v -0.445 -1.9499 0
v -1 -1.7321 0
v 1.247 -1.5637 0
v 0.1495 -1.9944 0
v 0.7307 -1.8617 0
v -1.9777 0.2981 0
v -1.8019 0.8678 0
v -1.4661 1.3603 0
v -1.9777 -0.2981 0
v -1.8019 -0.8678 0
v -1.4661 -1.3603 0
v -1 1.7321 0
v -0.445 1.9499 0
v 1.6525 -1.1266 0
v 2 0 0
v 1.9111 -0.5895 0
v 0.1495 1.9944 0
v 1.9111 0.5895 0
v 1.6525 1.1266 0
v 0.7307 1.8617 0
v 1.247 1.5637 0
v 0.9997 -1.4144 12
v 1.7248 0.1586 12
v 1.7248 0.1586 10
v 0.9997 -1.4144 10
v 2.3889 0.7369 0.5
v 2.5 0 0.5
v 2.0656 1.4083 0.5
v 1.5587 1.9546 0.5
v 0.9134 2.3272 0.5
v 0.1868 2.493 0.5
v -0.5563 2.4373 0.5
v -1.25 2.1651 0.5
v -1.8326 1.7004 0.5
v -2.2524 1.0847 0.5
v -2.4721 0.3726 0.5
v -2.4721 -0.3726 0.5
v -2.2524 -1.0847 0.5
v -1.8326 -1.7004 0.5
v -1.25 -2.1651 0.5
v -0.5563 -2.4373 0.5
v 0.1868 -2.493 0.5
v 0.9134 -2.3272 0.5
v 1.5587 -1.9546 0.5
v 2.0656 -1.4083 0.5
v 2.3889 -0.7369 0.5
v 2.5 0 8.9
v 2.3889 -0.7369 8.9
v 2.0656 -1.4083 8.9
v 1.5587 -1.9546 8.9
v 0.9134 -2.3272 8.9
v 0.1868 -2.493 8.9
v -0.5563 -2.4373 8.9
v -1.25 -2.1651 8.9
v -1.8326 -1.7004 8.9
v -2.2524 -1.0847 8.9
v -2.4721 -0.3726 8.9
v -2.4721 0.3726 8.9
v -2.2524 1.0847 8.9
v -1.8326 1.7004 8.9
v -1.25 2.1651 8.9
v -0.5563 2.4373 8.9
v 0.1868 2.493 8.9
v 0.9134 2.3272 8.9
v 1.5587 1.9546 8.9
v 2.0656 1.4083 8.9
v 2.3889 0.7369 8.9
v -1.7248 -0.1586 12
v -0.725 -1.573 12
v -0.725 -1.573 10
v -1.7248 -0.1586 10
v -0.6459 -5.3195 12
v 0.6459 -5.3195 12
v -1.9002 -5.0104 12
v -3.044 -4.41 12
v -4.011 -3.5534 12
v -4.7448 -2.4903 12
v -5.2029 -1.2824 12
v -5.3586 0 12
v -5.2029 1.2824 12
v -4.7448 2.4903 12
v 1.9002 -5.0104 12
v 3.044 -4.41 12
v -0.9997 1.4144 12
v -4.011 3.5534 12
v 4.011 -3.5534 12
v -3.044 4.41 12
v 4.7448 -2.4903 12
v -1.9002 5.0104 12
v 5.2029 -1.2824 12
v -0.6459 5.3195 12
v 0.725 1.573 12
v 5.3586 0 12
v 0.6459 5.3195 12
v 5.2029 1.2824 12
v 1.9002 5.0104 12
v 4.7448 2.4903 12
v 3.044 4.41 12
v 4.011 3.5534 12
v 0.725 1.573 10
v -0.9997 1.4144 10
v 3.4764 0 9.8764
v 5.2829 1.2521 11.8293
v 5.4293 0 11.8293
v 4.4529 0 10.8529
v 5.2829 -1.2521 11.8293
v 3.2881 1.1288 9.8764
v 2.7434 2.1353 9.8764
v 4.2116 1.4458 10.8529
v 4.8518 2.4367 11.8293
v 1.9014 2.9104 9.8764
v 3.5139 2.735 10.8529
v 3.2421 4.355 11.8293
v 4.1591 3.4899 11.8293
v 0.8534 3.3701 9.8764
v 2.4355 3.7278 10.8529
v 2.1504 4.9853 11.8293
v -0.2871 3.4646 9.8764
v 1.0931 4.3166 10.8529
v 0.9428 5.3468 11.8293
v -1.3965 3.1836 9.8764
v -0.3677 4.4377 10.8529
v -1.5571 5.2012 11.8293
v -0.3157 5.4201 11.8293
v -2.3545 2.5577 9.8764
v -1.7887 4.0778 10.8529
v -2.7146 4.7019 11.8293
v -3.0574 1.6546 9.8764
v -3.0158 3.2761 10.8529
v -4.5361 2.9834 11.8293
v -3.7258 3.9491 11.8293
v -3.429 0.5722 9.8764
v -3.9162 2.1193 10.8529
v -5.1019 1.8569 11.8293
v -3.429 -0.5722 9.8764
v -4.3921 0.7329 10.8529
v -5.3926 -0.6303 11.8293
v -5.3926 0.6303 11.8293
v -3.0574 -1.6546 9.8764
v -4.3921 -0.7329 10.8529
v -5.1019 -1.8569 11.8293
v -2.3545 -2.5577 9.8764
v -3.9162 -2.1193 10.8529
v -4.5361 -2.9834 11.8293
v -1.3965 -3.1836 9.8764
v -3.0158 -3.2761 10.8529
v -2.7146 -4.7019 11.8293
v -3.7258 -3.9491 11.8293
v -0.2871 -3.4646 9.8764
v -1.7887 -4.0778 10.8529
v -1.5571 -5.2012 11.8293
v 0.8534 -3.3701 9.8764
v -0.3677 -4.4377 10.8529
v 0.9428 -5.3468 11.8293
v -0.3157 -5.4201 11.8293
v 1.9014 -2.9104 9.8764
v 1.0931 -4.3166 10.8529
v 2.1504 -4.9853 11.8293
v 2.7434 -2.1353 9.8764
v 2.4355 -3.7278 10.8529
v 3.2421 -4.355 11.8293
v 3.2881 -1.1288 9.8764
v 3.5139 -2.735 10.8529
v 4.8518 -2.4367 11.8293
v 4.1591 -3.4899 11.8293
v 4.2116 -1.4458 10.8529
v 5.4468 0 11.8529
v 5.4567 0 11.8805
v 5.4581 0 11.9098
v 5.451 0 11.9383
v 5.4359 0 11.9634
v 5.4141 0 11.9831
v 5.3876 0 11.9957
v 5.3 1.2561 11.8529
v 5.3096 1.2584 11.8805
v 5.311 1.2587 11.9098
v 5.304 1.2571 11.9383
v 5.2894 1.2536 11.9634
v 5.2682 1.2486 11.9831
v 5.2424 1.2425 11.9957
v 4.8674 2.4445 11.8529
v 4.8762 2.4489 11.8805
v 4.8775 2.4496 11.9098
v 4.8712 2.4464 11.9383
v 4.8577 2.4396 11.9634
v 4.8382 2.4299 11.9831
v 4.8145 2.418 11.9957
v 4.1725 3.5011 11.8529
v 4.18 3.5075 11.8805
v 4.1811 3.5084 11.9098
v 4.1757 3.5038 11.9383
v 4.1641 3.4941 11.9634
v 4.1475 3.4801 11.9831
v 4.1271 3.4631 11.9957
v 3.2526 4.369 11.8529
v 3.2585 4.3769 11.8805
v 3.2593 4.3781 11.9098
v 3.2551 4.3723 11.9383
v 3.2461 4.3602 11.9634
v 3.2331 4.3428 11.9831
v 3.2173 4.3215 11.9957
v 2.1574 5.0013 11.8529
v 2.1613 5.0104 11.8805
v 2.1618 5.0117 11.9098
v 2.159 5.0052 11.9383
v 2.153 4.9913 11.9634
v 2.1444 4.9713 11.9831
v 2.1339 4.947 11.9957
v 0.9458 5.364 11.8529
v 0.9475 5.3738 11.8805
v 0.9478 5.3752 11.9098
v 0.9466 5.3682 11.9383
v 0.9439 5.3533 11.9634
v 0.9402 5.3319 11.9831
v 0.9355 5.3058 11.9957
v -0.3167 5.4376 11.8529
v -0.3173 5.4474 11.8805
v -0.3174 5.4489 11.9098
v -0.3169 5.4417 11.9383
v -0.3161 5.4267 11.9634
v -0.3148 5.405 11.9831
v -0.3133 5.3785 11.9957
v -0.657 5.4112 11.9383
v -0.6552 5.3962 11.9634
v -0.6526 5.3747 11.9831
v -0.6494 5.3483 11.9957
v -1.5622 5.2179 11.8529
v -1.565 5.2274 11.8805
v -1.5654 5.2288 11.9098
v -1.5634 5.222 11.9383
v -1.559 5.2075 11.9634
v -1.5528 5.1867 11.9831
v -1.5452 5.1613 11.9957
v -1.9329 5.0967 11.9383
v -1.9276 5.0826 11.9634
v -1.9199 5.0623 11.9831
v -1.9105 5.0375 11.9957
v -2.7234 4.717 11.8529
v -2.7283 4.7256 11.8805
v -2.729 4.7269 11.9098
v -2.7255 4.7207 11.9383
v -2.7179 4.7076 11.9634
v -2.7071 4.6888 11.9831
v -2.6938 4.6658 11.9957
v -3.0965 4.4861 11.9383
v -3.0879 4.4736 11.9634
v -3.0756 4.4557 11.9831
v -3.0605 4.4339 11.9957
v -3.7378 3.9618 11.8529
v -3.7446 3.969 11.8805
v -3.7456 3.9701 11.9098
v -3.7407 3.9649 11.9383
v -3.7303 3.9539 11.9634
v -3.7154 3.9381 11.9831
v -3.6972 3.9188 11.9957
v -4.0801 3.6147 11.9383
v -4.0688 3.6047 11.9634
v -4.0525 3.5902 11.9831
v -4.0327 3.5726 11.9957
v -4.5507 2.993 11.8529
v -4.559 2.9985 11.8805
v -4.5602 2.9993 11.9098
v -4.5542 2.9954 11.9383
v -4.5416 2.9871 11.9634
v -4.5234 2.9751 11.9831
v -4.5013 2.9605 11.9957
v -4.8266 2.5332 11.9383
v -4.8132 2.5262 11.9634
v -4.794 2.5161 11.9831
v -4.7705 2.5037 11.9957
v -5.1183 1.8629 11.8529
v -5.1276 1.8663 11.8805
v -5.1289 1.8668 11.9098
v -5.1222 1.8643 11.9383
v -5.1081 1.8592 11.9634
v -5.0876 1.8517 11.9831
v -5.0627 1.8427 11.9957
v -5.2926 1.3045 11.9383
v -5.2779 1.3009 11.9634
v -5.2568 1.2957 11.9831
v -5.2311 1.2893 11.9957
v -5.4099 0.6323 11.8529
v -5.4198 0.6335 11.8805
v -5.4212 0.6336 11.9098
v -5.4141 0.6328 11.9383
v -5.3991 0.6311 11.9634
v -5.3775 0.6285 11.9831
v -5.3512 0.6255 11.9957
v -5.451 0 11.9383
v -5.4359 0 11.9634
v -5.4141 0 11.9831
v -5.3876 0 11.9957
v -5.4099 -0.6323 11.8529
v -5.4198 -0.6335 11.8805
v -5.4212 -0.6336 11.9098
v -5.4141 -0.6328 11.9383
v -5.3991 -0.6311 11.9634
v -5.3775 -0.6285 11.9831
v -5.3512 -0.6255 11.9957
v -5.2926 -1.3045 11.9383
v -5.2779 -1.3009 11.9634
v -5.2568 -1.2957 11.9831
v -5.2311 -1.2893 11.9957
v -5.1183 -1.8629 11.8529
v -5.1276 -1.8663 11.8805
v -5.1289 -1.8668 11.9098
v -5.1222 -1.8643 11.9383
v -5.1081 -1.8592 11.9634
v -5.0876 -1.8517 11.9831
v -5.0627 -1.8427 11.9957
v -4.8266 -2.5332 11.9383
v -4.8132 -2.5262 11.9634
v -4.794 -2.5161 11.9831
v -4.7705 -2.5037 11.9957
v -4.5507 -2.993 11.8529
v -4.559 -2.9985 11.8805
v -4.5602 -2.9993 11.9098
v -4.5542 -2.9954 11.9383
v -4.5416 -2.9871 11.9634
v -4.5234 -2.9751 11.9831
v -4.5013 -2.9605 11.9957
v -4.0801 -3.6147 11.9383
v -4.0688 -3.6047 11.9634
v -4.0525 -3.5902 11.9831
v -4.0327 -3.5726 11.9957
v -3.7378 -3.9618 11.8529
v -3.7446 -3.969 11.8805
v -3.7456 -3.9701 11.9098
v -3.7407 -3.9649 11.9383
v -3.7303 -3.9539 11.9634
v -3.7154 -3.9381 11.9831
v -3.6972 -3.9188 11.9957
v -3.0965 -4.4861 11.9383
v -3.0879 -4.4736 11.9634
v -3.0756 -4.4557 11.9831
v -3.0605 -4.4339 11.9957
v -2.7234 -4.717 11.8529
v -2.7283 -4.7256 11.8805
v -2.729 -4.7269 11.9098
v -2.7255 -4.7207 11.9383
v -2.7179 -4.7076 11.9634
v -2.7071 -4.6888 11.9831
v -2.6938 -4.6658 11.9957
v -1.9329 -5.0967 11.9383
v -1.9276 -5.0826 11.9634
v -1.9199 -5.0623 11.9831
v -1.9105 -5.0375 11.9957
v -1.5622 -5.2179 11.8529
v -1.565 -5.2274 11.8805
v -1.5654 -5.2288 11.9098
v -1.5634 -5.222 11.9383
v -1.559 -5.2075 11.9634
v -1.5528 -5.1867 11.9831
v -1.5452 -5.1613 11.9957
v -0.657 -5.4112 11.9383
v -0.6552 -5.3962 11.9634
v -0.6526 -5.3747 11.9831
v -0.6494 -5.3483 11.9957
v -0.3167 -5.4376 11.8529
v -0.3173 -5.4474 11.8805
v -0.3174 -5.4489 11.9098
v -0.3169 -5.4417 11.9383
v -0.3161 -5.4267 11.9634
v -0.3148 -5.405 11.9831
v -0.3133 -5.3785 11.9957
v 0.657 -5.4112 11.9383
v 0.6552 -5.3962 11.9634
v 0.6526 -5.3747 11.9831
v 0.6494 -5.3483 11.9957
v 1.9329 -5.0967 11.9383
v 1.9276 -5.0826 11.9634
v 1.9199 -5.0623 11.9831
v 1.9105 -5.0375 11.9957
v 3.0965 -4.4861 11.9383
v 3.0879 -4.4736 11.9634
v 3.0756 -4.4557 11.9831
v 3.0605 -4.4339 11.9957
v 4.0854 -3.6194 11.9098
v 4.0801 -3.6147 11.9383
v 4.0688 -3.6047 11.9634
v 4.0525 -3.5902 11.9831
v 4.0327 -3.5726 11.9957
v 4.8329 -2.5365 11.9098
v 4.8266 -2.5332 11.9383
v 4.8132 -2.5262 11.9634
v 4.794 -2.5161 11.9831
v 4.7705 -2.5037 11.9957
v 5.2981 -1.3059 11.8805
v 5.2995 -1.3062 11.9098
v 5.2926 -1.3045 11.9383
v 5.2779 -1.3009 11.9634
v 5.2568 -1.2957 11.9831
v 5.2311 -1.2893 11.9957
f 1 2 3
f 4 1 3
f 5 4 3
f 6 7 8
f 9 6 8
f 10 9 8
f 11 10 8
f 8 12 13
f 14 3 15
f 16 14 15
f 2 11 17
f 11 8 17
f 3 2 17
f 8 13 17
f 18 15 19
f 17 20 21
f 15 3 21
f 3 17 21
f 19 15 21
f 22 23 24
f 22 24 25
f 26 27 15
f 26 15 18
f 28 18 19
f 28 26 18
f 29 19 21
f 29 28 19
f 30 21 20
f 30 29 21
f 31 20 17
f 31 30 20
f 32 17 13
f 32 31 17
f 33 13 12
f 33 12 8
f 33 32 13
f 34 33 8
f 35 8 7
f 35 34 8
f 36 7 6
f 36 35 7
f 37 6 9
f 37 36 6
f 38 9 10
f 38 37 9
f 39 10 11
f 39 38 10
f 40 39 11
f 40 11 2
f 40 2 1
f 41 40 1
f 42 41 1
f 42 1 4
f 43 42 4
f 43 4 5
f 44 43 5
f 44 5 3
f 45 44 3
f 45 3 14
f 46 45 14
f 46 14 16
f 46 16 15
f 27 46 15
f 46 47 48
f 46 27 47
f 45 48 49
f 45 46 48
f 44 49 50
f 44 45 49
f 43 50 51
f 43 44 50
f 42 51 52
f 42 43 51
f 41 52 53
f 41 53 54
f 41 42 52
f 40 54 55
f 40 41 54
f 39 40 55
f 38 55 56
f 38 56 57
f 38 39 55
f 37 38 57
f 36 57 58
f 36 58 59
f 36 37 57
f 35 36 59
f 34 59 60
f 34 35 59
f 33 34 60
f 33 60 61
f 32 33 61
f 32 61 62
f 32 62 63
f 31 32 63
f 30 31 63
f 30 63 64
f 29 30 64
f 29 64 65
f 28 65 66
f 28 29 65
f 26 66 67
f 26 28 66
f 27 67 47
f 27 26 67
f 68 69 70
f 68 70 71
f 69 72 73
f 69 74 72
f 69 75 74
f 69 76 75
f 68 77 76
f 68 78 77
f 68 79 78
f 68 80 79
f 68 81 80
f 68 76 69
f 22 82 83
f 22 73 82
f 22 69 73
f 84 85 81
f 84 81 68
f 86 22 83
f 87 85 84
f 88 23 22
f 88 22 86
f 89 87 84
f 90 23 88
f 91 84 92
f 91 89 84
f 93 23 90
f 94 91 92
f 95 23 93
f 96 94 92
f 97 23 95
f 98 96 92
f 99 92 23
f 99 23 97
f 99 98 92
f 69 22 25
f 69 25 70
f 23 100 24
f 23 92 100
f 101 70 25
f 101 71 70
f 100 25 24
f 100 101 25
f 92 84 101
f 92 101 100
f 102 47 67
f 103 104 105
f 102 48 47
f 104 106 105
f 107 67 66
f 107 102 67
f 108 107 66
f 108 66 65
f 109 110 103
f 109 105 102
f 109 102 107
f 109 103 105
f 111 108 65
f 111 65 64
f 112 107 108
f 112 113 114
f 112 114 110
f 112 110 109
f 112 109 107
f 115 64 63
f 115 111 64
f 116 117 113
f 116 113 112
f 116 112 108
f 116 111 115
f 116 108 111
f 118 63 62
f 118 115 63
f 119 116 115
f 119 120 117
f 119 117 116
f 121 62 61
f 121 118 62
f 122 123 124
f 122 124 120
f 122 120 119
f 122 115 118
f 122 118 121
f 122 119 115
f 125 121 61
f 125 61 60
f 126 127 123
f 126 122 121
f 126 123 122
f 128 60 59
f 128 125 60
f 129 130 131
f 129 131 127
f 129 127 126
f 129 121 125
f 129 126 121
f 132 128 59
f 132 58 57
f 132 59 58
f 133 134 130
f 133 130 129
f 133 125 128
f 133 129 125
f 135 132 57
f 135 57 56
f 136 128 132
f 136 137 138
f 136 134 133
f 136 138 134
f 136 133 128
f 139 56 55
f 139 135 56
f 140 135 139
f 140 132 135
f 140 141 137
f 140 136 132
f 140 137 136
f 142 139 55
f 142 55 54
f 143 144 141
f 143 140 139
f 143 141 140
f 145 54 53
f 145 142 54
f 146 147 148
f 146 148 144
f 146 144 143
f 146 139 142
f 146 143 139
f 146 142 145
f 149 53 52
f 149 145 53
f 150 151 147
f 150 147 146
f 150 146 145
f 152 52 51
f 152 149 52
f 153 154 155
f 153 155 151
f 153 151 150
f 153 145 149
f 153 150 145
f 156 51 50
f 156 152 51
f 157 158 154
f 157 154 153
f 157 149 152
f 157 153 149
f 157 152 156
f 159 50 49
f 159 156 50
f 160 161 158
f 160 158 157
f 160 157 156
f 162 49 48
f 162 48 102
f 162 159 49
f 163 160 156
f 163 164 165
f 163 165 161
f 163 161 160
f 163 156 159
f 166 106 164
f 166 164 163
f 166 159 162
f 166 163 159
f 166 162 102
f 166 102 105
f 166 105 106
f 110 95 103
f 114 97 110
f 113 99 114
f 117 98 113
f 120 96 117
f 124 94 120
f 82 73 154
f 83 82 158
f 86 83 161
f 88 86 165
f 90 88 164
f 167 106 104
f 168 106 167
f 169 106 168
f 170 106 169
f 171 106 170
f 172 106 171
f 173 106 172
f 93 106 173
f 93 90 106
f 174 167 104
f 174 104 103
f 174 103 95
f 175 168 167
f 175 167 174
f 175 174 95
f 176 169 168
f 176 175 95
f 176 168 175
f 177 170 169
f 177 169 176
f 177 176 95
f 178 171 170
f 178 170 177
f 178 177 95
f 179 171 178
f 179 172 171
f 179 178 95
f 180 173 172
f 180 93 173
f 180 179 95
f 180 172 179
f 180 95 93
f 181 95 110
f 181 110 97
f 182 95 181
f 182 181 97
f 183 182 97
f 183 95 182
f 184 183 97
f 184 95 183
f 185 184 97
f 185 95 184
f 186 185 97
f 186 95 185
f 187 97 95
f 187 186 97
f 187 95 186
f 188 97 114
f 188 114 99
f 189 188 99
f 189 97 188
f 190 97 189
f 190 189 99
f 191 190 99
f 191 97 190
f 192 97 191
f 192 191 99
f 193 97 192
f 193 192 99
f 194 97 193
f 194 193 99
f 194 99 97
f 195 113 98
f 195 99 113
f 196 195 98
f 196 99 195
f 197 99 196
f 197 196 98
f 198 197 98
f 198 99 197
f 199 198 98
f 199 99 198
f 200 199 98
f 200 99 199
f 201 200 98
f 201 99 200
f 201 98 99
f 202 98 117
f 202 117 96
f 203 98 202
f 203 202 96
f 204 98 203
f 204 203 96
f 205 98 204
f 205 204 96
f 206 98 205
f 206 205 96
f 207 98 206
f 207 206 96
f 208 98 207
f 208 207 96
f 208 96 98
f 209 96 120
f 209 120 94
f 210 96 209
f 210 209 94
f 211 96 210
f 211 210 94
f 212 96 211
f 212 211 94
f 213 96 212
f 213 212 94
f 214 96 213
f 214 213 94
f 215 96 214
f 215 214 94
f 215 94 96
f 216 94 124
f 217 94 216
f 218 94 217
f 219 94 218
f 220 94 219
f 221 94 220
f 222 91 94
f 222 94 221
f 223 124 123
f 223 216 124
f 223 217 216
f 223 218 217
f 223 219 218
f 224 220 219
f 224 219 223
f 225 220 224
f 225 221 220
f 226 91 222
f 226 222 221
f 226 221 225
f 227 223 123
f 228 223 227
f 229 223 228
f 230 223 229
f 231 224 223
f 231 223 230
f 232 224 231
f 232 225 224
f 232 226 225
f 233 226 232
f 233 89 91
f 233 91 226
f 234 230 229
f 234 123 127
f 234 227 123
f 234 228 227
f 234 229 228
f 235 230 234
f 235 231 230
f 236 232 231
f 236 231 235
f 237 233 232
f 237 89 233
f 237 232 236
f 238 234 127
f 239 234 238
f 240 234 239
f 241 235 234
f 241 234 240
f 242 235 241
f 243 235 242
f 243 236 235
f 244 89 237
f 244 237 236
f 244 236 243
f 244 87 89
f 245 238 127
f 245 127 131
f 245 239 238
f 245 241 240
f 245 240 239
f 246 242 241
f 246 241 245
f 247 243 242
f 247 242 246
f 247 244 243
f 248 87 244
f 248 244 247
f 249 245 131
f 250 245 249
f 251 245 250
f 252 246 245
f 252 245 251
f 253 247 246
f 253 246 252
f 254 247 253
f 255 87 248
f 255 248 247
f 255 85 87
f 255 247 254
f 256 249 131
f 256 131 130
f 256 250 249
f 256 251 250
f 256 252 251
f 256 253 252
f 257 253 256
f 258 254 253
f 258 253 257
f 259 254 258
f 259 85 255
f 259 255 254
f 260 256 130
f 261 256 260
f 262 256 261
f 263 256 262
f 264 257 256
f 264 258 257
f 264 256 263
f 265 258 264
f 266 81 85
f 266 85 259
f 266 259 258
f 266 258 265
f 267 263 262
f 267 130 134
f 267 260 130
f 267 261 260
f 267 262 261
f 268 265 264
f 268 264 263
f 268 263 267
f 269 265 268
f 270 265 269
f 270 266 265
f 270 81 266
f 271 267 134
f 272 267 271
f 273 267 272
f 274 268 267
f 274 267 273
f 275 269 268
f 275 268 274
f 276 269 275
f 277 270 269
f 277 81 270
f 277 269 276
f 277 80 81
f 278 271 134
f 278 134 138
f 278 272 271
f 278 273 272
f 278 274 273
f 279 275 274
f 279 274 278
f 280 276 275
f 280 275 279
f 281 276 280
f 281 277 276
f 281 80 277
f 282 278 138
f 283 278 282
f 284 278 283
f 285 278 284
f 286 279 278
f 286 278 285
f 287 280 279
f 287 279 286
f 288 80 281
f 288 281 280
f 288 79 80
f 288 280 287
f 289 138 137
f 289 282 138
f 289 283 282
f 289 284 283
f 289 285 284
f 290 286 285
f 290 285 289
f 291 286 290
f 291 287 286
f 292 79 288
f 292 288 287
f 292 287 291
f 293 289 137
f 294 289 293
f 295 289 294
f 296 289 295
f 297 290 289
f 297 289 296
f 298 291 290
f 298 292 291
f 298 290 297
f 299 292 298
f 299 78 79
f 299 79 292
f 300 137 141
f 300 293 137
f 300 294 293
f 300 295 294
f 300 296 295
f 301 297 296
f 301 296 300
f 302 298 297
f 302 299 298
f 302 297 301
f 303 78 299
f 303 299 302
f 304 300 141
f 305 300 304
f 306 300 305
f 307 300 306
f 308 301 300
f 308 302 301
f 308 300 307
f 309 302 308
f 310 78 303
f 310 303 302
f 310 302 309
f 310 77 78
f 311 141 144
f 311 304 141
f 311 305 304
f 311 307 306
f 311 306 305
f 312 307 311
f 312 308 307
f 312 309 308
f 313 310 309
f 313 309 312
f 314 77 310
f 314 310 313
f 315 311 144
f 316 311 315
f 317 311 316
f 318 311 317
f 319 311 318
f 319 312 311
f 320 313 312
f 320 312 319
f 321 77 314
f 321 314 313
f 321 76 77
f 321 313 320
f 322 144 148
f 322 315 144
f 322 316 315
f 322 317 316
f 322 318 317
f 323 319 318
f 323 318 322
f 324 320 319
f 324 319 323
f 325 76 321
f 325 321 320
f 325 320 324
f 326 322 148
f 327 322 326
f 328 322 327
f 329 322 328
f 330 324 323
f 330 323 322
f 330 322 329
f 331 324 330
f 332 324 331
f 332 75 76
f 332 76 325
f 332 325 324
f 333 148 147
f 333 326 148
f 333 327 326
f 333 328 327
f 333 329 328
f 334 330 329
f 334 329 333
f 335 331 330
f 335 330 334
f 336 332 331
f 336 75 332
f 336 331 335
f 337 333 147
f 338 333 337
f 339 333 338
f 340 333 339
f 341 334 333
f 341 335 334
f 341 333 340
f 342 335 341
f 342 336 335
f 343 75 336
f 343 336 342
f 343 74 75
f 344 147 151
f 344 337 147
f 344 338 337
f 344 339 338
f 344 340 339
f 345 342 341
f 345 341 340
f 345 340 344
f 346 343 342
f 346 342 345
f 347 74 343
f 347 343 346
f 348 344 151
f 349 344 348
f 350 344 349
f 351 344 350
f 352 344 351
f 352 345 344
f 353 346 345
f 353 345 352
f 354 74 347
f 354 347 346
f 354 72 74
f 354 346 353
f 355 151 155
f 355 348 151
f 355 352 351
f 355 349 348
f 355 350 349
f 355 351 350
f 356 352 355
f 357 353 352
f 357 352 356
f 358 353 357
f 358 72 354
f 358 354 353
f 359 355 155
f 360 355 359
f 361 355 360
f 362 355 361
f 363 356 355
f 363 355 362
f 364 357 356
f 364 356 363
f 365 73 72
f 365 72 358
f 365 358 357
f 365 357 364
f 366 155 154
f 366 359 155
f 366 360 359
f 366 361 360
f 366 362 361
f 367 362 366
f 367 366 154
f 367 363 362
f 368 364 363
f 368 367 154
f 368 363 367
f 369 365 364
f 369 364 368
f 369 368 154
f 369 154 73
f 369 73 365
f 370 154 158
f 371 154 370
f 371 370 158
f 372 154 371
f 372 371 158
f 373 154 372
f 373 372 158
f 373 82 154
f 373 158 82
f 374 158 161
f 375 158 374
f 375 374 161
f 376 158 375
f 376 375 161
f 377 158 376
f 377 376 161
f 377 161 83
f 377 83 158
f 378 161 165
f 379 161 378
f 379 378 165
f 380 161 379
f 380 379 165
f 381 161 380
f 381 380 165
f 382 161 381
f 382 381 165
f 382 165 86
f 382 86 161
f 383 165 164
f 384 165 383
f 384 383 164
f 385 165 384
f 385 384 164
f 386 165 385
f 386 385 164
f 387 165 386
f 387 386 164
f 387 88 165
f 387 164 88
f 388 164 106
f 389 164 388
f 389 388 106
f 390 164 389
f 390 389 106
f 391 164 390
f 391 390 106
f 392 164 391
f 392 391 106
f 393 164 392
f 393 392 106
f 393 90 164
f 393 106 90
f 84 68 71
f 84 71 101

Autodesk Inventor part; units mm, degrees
ref_plane "YZ Plane" through (0, 0, 0) normal (1, 0, 0) x (0, 1, 0)
ref_plane "XZ Plane" through (0, 0, 0) normal (0, 1, 0) x (-1, 0, 0)
ref_plane "XY Plane" through (0, 0, 0) normal (0, 0, 1) x (1, 0, 0)
sketch "Sketch1" plane through (0, 0, 0) normal (0, 0, 1) x (1, 0, 0)
  circle A0 centre (0, 0) radius 2.5
  dimension "Diameter" = 5
extrude "Extrusion1" add sketch "Sketch1" along normal blind 8.9
sketch "Sketch2" plane through (0, 0, 8.9) normal (0, 0, 1) x (1, 0, 0)
  circle A0 centre (0, 0) radius 2.5 projected
extrude "Extrusion2" add sketch "Sketch2" along normal blind 3.1 draft 45
sketch "Sketch3" plane through (0, 0, 12) normal (0, 0, 1) x (1, 0, 0)
  circle A0 centre (0, 0) radius 5.6 projected
  circle A1 centre (0, 0) radius 1.7321 construction
  line L0 (0.725, 1.573) -> (1.7248, 0.1586)
  line L1 (1.7248, 0.1586) -> (0.9997, -1.4144)
  line L2 (0.9997, -1.4144) -> (-0.725, -1.573)
  line L3 (-0.725, -1.573) -> (-1.7248, -0.1586)
  line L4 (-1.7248, -0.1586) -> (-0.9997, 1.4144)
  line L5 (-0.9997, 1.4144) -> (0.725, 1.573)
  dimension "Hex_Width" = 3
extrude "Extrusion3" cut sketch "Sketch3" against normal blind 2 contours L0 L1 L2 L3 L4 L5
thread "Thread1" size "M5x0.8" class "4g6g" standard "ANSI Metric M Profile" length 8.9
chamfer "Chamfer2" distance 0.5 angle 45 1 edges at (-2.5, 0, 0)
fillet "Fillet1" radius 0.1 1 edges at (-5.6, 0, 12)
equation "\"d10\" = Thread_Length"
equation "\"d13\" = Chamfer"
equation "\"Thread_Length\" = 8.9"
equation "\"Length\" = 12"
equation "\"Chamfer\" = 0.5"
properties part number "SCREW, FLAT HD, P, 5, M5X0_8X12MM"
